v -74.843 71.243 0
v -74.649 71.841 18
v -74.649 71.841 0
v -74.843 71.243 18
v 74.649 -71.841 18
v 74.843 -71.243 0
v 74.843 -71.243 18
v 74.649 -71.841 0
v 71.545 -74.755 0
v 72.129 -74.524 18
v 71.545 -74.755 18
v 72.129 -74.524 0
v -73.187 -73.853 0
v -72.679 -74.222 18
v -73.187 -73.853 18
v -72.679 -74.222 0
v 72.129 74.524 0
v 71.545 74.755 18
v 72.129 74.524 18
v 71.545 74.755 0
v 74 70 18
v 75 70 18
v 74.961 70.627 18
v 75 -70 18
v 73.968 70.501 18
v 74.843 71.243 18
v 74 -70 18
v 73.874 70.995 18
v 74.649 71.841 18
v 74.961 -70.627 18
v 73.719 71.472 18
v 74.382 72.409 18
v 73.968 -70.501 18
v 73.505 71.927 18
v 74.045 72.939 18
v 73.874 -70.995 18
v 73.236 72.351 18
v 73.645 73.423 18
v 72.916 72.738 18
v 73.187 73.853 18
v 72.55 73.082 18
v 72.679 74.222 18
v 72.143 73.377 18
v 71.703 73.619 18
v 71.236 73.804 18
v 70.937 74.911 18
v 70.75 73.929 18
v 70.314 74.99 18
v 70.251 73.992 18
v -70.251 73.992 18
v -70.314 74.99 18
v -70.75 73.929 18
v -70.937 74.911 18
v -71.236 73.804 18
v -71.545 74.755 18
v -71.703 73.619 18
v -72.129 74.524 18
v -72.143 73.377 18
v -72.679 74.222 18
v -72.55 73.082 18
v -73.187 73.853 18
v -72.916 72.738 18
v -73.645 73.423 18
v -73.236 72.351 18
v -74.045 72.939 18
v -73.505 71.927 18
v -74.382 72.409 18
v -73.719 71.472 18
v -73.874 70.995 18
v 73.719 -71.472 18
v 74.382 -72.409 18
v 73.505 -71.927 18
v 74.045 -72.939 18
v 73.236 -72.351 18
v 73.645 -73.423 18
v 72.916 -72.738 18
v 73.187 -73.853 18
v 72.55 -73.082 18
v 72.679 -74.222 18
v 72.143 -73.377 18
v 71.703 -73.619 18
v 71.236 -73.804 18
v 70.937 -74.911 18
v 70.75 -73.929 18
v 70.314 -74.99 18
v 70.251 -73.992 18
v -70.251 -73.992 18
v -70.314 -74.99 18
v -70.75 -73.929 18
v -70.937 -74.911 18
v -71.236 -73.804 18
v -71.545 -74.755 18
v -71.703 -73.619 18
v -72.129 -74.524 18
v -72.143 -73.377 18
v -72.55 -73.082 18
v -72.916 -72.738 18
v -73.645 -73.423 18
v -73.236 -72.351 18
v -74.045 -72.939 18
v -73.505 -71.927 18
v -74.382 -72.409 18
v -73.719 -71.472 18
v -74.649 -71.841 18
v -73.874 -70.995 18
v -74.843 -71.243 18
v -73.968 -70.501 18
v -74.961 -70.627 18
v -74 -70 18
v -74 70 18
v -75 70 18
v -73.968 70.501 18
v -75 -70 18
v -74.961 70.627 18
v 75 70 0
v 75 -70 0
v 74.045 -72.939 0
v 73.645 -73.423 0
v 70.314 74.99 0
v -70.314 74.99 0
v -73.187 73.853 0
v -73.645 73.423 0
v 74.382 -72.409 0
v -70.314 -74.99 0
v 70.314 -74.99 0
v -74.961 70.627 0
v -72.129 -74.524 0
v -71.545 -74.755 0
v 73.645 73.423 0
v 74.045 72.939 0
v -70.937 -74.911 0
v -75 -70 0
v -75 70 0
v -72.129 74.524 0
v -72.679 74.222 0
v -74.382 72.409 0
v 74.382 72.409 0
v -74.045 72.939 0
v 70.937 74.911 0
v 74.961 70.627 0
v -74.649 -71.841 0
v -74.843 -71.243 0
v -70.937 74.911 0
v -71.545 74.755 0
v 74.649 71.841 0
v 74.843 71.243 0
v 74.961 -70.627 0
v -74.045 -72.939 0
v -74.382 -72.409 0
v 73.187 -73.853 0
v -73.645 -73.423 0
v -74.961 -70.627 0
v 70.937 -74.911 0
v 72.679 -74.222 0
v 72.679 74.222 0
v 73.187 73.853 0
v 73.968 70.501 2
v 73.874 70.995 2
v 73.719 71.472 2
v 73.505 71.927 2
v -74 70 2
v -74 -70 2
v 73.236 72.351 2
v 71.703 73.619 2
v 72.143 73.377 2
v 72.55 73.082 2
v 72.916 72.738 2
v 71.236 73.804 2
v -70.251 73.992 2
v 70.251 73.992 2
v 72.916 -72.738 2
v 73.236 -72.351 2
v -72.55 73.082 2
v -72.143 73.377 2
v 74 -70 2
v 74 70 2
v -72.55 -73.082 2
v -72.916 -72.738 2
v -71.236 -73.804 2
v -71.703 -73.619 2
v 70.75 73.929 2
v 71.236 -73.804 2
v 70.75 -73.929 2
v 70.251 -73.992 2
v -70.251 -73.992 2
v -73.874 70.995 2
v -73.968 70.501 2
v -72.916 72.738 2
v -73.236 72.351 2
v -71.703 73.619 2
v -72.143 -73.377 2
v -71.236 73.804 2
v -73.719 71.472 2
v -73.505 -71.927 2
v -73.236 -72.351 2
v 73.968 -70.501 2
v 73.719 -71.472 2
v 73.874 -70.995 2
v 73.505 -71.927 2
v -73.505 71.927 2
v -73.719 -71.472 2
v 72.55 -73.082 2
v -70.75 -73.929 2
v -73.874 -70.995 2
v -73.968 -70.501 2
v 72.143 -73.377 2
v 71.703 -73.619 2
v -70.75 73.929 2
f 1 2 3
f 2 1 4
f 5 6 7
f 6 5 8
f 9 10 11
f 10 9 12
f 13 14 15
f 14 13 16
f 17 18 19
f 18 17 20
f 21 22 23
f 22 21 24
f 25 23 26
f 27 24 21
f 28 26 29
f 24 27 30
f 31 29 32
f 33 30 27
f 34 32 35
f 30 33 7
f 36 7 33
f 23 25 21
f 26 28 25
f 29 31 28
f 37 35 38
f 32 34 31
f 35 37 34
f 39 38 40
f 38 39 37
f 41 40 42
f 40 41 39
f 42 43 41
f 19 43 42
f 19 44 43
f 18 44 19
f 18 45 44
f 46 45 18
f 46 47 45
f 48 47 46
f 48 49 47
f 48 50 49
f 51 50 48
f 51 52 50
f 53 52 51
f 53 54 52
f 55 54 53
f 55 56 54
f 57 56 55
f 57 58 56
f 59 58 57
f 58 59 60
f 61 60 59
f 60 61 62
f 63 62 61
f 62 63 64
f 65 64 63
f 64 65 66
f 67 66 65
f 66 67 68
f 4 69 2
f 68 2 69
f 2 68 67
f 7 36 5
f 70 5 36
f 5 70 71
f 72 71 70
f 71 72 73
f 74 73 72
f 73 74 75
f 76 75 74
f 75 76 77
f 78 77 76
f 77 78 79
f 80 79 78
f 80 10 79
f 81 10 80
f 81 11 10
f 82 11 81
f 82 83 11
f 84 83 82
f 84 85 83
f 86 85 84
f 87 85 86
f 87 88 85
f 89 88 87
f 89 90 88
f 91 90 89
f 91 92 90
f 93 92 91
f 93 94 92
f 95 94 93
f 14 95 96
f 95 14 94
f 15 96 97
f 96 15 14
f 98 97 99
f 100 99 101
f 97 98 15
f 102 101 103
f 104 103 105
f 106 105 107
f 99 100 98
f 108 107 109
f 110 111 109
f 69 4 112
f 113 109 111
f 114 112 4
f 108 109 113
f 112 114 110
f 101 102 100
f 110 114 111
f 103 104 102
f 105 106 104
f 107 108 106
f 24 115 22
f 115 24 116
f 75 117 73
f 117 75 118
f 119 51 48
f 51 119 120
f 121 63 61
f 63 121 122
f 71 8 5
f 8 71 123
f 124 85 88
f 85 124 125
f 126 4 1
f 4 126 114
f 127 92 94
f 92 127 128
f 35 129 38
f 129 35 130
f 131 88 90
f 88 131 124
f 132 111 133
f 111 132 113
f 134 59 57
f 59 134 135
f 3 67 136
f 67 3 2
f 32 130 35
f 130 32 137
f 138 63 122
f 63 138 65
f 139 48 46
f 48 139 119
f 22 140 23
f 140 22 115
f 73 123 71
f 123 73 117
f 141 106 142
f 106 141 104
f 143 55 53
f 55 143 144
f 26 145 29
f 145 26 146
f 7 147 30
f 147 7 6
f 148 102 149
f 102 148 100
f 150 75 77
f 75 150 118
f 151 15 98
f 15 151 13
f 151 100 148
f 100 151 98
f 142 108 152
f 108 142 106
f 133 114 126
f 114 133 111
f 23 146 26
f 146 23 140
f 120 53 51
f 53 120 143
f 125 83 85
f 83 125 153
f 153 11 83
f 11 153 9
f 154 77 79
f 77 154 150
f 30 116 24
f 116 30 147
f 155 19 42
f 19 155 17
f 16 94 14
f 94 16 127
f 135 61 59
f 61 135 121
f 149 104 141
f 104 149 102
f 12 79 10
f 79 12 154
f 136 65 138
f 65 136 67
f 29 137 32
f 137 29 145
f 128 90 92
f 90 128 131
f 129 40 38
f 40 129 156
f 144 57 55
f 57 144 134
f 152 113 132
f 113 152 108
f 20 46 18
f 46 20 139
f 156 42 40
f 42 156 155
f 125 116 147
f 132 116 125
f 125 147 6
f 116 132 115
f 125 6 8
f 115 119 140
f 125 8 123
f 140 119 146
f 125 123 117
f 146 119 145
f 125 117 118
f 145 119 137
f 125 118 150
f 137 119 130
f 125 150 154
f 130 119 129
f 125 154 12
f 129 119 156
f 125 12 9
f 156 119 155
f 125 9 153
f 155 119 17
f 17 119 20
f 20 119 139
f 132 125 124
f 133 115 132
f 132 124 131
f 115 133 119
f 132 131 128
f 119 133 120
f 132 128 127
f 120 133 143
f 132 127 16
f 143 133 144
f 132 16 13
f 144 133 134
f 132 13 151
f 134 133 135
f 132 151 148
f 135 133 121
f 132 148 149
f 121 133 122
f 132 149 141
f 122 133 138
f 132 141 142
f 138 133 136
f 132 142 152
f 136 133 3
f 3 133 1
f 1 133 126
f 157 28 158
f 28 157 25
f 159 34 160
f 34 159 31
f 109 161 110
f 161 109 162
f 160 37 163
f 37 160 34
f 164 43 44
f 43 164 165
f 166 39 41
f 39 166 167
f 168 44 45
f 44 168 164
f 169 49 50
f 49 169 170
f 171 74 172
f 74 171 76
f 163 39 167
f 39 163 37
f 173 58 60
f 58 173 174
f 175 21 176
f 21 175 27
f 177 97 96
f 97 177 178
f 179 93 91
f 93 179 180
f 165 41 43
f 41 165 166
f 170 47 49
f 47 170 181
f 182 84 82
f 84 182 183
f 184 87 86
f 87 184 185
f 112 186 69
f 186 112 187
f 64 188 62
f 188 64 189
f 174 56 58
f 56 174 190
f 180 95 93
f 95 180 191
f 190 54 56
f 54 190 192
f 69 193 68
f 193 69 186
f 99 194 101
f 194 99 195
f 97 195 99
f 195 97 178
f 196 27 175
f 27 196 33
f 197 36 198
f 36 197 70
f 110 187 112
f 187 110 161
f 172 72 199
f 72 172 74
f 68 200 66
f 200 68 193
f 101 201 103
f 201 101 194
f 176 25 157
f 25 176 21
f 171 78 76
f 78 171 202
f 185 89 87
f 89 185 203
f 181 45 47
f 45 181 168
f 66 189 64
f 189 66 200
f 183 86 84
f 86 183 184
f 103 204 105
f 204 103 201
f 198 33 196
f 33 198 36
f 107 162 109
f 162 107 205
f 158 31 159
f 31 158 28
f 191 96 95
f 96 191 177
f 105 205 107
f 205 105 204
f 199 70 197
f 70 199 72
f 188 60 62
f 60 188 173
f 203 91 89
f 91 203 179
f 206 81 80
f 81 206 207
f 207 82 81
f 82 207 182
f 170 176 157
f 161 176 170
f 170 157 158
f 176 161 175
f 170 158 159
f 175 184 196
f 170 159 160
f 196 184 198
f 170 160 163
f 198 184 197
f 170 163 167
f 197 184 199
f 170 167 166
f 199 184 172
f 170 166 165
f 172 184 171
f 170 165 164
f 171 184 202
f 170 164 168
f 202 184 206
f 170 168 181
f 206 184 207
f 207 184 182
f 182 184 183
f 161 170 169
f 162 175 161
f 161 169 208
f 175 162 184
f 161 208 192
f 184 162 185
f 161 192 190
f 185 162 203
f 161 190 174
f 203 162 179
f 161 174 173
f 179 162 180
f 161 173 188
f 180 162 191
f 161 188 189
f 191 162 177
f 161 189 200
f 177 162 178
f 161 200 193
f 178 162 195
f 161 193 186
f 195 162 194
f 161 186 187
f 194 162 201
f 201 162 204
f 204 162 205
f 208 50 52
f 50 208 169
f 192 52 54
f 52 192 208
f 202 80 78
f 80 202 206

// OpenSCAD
$fn = 50;


difference() {
	union() {
		hull() {
			translate(v = [-70.0000000000, 70.0000000000, 0]) {
				cylinder(h = 18, r = 5);
			}
			translate(v = [70.0000000000, 70.0000000000, 0]) {
				cylinder(h = 18, r = 5);
			}
			translate(v = [-70.0000000000, -70.0000000000, 0]) {
				cylinder(h = 18, r = 5);
			}
			translate(v = [70.0000000000, -70.0000000000, 0]) {
				cylinder(h = 18, r = 5);
			}
		}
	}
	union() {
		translate(v = [0, 0, 2]) {
			hull() {
				translate(v = [-70.0000000000, 70.0000000000, 0]) {
					cylinder(h = 16, r = 4);
				}
				translate(v = [70.0000000000, 70.0000000000, 0]) {
					cylinder(h = 16, r = 4);
				}
				translate(v = [-70.0000000000, -70.0000000000, 0]) {
					cylinder(h = 16, r = 4);
				}
				translate(v = [70.0000000000, -70.0000000000, 0]) {
					cylinder(h = 16, r = 4);
				}
			}
		}
	}
}
